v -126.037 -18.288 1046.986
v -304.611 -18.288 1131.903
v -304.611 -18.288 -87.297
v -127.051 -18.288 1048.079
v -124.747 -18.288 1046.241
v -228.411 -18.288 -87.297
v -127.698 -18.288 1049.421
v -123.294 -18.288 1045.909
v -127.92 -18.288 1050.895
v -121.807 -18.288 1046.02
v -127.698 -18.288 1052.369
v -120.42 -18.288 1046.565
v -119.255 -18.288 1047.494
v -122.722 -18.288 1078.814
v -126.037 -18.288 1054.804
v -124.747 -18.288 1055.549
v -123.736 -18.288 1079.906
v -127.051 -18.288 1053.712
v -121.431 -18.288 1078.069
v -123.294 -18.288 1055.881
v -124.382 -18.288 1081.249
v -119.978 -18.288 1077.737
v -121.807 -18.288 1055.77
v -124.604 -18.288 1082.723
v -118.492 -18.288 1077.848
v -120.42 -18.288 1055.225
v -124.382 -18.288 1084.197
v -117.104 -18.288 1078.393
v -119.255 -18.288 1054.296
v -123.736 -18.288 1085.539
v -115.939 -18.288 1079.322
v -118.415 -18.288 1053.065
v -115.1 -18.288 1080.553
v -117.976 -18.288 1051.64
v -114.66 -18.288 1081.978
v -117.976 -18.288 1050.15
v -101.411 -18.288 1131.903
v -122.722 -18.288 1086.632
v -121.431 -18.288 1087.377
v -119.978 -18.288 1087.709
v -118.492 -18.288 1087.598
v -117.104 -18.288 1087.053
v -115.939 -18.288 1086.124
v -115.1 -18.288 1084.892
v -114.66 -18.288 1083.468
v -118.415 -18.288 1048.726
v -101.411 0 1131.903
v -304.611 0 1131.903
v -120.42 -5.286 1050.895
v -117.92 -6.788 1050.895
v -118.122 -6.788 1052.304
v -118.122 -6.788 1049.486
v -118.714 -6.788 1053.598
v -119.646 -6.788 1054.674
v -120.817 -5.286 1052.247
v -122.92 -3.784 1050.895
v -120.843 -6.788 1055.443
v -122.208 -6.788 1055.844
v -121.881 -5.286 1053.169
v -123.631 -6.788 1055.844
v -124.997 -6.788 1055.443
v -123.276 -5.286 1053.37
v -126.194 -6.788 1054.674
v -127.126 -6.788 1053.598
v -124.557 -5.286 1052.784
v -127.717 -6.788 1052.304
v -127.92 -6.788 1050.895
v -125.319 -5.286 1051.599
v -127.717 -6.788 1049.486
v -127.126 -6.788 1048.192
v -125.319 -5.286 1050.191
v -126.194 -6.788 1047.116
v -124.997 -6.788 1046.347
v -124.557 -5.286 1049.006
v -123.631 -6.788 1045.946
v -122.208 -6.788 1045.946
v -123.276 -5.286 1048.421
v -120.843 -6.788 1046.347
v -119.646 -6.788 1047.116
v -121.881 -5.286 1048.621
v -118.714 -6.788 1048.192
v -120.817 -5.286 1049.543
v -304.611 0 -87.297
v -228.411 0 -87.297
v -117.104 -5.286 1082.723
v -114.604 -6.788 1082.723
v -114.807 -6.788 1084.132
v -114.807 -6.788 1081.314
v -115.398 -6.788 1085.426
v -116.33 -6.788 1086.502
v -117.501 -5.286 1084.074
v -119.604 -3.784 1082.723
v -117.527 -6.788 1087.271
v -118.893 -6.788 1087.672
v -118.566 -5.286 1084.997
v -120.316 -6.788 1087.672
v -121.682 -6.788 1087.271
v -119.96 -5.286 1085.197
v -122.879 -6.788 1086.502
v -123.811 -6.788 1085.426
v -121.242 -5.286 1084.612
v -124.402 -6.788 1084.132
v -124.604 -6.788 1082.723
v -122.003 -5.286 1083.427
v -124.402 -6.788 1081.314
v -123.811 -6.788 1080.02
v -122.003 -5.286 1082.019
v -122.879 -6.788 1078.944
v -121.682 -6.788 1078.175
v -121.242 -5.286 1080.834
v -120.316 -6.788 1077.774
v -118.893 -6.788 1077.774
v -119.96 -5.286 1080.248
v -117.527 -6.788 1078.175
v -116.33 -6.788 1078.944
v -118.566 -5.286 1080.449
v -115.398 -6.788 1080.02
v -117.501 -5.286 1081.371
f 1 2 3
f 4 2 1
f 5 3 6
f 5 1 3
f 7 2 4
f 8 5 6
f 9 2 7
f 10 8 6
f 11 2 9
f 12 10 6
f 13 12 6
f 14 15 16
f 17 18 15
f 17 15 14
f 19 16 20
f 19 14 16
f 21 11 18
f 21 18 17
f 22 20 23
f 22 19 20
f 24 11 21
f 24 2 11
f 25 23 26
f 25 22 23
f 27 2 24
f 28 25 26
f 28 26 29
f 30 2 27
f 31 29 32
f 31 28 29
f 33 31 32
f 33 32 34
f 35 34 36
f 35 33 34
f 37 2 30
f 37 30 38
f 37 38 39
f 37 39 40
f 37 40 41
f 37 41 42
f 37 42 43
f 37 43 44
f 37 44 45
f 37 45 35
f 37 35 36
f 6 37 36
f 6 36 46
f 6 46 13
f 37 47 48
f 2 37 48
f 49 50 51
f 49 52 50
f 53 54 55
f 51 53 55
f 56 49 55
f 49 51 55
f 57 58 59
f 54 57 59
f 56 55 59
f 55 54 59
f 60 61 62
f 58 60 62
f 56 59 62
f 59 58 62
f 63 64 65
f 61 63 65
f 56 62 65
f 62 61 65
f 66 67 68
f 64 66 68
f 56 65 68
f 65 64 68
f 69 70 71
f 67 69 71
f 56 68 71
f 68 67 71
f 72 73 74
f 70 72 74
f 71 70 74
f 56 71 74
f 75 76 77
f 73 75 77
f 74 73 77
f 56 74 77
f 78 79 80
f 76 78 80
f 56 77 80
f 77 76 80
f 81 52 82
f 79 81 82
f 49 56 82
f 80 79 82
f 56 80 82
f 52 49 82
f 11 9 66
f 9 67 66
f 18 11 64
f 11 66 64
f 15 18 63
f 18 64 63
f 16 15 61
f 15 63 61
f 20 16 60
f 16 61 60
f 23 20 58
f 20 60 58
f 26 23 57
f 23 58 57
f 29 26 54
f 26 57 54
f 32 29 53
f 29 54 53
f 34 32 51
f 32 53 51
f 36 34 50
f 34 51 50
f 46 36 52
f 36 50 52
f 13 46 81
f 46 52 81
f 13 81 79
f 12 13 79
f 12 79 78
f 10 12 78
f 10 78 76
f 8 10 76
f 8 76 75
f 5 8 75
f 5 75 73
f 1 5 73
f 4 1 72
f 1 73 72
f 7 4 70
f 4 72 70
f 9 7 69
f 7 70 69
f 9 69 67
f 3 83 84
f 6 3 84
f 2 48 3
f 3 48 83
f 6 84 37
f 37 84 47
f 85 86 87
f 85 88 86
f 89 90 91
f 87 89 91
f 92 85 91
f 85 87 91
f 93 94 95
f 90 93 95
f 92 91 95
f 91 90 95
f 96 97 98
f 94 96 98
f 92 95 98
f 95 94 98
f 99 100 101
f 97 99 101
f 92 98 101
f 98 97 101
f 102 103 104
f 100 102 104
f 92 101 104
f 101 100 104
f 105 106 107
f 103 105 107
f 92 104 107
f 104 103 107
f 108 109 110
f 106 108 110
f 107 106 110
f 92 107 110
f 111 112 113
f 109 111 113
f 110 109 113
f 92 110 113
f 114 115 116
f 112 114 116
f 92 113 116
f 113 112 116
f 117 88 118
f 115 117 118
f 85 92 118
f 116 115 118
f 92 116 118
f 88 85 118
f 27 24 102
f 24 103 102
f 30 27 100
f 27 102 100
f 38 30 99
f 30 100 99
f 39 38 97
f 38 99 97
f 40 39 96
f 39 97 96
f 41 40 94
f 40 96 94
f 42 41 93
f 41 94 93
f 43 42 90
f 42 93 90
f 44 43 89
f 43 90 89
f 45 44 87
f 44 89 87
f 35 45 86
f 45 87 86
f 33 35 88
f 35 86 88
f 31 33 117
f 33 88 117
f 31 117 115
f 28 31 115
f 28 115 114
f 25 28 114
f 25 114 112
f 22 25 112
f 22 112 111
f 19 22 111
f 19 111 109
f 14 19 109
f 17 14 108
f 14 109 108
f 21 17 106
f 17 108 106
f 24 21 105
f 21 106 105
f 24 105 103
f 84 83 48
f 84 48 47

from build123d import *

# Parameters (mm, degrees)
F2_DEPTH = 18.288
F4_D     = 10
F4_DEPTH = 11.5
F4_TIP   = 3.0043030951


# Not quite as in the source:
# - a variable given as a bare number and used for a length is read in inches; the dataset says mm whatever the document's units were


with BuildPart() as f2:
    # F0 (on Front) → F2 (new body)
    with BuildSketch(Plane.XZ):
        Polygon((-304.6112403404, 1131.9026269978), (-304.6112403404, -87.2973730022), (-228.4112403404, -87.2973730022), (-101.4112403404, 1131.9026269978), align=None)
    extrude(amount=F2_DEPTH)

    # F4
    with Locations(Plane.XZ.offset(18.288)):
        with Locations((-119.6044687363, 1082.7228909215), (-122.9198634326, 1050.895101837)):
            Hole(F4_D / 2, depth=F4_DEPTH)
            with Locations((0, 0, -(F4_DEPTH + F4_TIP / 2))):  # 118° drill point
                Cone(0, F4_D / 2, F4_TIP, mode=Mode.SUBTRACT)


solid = f2.part
